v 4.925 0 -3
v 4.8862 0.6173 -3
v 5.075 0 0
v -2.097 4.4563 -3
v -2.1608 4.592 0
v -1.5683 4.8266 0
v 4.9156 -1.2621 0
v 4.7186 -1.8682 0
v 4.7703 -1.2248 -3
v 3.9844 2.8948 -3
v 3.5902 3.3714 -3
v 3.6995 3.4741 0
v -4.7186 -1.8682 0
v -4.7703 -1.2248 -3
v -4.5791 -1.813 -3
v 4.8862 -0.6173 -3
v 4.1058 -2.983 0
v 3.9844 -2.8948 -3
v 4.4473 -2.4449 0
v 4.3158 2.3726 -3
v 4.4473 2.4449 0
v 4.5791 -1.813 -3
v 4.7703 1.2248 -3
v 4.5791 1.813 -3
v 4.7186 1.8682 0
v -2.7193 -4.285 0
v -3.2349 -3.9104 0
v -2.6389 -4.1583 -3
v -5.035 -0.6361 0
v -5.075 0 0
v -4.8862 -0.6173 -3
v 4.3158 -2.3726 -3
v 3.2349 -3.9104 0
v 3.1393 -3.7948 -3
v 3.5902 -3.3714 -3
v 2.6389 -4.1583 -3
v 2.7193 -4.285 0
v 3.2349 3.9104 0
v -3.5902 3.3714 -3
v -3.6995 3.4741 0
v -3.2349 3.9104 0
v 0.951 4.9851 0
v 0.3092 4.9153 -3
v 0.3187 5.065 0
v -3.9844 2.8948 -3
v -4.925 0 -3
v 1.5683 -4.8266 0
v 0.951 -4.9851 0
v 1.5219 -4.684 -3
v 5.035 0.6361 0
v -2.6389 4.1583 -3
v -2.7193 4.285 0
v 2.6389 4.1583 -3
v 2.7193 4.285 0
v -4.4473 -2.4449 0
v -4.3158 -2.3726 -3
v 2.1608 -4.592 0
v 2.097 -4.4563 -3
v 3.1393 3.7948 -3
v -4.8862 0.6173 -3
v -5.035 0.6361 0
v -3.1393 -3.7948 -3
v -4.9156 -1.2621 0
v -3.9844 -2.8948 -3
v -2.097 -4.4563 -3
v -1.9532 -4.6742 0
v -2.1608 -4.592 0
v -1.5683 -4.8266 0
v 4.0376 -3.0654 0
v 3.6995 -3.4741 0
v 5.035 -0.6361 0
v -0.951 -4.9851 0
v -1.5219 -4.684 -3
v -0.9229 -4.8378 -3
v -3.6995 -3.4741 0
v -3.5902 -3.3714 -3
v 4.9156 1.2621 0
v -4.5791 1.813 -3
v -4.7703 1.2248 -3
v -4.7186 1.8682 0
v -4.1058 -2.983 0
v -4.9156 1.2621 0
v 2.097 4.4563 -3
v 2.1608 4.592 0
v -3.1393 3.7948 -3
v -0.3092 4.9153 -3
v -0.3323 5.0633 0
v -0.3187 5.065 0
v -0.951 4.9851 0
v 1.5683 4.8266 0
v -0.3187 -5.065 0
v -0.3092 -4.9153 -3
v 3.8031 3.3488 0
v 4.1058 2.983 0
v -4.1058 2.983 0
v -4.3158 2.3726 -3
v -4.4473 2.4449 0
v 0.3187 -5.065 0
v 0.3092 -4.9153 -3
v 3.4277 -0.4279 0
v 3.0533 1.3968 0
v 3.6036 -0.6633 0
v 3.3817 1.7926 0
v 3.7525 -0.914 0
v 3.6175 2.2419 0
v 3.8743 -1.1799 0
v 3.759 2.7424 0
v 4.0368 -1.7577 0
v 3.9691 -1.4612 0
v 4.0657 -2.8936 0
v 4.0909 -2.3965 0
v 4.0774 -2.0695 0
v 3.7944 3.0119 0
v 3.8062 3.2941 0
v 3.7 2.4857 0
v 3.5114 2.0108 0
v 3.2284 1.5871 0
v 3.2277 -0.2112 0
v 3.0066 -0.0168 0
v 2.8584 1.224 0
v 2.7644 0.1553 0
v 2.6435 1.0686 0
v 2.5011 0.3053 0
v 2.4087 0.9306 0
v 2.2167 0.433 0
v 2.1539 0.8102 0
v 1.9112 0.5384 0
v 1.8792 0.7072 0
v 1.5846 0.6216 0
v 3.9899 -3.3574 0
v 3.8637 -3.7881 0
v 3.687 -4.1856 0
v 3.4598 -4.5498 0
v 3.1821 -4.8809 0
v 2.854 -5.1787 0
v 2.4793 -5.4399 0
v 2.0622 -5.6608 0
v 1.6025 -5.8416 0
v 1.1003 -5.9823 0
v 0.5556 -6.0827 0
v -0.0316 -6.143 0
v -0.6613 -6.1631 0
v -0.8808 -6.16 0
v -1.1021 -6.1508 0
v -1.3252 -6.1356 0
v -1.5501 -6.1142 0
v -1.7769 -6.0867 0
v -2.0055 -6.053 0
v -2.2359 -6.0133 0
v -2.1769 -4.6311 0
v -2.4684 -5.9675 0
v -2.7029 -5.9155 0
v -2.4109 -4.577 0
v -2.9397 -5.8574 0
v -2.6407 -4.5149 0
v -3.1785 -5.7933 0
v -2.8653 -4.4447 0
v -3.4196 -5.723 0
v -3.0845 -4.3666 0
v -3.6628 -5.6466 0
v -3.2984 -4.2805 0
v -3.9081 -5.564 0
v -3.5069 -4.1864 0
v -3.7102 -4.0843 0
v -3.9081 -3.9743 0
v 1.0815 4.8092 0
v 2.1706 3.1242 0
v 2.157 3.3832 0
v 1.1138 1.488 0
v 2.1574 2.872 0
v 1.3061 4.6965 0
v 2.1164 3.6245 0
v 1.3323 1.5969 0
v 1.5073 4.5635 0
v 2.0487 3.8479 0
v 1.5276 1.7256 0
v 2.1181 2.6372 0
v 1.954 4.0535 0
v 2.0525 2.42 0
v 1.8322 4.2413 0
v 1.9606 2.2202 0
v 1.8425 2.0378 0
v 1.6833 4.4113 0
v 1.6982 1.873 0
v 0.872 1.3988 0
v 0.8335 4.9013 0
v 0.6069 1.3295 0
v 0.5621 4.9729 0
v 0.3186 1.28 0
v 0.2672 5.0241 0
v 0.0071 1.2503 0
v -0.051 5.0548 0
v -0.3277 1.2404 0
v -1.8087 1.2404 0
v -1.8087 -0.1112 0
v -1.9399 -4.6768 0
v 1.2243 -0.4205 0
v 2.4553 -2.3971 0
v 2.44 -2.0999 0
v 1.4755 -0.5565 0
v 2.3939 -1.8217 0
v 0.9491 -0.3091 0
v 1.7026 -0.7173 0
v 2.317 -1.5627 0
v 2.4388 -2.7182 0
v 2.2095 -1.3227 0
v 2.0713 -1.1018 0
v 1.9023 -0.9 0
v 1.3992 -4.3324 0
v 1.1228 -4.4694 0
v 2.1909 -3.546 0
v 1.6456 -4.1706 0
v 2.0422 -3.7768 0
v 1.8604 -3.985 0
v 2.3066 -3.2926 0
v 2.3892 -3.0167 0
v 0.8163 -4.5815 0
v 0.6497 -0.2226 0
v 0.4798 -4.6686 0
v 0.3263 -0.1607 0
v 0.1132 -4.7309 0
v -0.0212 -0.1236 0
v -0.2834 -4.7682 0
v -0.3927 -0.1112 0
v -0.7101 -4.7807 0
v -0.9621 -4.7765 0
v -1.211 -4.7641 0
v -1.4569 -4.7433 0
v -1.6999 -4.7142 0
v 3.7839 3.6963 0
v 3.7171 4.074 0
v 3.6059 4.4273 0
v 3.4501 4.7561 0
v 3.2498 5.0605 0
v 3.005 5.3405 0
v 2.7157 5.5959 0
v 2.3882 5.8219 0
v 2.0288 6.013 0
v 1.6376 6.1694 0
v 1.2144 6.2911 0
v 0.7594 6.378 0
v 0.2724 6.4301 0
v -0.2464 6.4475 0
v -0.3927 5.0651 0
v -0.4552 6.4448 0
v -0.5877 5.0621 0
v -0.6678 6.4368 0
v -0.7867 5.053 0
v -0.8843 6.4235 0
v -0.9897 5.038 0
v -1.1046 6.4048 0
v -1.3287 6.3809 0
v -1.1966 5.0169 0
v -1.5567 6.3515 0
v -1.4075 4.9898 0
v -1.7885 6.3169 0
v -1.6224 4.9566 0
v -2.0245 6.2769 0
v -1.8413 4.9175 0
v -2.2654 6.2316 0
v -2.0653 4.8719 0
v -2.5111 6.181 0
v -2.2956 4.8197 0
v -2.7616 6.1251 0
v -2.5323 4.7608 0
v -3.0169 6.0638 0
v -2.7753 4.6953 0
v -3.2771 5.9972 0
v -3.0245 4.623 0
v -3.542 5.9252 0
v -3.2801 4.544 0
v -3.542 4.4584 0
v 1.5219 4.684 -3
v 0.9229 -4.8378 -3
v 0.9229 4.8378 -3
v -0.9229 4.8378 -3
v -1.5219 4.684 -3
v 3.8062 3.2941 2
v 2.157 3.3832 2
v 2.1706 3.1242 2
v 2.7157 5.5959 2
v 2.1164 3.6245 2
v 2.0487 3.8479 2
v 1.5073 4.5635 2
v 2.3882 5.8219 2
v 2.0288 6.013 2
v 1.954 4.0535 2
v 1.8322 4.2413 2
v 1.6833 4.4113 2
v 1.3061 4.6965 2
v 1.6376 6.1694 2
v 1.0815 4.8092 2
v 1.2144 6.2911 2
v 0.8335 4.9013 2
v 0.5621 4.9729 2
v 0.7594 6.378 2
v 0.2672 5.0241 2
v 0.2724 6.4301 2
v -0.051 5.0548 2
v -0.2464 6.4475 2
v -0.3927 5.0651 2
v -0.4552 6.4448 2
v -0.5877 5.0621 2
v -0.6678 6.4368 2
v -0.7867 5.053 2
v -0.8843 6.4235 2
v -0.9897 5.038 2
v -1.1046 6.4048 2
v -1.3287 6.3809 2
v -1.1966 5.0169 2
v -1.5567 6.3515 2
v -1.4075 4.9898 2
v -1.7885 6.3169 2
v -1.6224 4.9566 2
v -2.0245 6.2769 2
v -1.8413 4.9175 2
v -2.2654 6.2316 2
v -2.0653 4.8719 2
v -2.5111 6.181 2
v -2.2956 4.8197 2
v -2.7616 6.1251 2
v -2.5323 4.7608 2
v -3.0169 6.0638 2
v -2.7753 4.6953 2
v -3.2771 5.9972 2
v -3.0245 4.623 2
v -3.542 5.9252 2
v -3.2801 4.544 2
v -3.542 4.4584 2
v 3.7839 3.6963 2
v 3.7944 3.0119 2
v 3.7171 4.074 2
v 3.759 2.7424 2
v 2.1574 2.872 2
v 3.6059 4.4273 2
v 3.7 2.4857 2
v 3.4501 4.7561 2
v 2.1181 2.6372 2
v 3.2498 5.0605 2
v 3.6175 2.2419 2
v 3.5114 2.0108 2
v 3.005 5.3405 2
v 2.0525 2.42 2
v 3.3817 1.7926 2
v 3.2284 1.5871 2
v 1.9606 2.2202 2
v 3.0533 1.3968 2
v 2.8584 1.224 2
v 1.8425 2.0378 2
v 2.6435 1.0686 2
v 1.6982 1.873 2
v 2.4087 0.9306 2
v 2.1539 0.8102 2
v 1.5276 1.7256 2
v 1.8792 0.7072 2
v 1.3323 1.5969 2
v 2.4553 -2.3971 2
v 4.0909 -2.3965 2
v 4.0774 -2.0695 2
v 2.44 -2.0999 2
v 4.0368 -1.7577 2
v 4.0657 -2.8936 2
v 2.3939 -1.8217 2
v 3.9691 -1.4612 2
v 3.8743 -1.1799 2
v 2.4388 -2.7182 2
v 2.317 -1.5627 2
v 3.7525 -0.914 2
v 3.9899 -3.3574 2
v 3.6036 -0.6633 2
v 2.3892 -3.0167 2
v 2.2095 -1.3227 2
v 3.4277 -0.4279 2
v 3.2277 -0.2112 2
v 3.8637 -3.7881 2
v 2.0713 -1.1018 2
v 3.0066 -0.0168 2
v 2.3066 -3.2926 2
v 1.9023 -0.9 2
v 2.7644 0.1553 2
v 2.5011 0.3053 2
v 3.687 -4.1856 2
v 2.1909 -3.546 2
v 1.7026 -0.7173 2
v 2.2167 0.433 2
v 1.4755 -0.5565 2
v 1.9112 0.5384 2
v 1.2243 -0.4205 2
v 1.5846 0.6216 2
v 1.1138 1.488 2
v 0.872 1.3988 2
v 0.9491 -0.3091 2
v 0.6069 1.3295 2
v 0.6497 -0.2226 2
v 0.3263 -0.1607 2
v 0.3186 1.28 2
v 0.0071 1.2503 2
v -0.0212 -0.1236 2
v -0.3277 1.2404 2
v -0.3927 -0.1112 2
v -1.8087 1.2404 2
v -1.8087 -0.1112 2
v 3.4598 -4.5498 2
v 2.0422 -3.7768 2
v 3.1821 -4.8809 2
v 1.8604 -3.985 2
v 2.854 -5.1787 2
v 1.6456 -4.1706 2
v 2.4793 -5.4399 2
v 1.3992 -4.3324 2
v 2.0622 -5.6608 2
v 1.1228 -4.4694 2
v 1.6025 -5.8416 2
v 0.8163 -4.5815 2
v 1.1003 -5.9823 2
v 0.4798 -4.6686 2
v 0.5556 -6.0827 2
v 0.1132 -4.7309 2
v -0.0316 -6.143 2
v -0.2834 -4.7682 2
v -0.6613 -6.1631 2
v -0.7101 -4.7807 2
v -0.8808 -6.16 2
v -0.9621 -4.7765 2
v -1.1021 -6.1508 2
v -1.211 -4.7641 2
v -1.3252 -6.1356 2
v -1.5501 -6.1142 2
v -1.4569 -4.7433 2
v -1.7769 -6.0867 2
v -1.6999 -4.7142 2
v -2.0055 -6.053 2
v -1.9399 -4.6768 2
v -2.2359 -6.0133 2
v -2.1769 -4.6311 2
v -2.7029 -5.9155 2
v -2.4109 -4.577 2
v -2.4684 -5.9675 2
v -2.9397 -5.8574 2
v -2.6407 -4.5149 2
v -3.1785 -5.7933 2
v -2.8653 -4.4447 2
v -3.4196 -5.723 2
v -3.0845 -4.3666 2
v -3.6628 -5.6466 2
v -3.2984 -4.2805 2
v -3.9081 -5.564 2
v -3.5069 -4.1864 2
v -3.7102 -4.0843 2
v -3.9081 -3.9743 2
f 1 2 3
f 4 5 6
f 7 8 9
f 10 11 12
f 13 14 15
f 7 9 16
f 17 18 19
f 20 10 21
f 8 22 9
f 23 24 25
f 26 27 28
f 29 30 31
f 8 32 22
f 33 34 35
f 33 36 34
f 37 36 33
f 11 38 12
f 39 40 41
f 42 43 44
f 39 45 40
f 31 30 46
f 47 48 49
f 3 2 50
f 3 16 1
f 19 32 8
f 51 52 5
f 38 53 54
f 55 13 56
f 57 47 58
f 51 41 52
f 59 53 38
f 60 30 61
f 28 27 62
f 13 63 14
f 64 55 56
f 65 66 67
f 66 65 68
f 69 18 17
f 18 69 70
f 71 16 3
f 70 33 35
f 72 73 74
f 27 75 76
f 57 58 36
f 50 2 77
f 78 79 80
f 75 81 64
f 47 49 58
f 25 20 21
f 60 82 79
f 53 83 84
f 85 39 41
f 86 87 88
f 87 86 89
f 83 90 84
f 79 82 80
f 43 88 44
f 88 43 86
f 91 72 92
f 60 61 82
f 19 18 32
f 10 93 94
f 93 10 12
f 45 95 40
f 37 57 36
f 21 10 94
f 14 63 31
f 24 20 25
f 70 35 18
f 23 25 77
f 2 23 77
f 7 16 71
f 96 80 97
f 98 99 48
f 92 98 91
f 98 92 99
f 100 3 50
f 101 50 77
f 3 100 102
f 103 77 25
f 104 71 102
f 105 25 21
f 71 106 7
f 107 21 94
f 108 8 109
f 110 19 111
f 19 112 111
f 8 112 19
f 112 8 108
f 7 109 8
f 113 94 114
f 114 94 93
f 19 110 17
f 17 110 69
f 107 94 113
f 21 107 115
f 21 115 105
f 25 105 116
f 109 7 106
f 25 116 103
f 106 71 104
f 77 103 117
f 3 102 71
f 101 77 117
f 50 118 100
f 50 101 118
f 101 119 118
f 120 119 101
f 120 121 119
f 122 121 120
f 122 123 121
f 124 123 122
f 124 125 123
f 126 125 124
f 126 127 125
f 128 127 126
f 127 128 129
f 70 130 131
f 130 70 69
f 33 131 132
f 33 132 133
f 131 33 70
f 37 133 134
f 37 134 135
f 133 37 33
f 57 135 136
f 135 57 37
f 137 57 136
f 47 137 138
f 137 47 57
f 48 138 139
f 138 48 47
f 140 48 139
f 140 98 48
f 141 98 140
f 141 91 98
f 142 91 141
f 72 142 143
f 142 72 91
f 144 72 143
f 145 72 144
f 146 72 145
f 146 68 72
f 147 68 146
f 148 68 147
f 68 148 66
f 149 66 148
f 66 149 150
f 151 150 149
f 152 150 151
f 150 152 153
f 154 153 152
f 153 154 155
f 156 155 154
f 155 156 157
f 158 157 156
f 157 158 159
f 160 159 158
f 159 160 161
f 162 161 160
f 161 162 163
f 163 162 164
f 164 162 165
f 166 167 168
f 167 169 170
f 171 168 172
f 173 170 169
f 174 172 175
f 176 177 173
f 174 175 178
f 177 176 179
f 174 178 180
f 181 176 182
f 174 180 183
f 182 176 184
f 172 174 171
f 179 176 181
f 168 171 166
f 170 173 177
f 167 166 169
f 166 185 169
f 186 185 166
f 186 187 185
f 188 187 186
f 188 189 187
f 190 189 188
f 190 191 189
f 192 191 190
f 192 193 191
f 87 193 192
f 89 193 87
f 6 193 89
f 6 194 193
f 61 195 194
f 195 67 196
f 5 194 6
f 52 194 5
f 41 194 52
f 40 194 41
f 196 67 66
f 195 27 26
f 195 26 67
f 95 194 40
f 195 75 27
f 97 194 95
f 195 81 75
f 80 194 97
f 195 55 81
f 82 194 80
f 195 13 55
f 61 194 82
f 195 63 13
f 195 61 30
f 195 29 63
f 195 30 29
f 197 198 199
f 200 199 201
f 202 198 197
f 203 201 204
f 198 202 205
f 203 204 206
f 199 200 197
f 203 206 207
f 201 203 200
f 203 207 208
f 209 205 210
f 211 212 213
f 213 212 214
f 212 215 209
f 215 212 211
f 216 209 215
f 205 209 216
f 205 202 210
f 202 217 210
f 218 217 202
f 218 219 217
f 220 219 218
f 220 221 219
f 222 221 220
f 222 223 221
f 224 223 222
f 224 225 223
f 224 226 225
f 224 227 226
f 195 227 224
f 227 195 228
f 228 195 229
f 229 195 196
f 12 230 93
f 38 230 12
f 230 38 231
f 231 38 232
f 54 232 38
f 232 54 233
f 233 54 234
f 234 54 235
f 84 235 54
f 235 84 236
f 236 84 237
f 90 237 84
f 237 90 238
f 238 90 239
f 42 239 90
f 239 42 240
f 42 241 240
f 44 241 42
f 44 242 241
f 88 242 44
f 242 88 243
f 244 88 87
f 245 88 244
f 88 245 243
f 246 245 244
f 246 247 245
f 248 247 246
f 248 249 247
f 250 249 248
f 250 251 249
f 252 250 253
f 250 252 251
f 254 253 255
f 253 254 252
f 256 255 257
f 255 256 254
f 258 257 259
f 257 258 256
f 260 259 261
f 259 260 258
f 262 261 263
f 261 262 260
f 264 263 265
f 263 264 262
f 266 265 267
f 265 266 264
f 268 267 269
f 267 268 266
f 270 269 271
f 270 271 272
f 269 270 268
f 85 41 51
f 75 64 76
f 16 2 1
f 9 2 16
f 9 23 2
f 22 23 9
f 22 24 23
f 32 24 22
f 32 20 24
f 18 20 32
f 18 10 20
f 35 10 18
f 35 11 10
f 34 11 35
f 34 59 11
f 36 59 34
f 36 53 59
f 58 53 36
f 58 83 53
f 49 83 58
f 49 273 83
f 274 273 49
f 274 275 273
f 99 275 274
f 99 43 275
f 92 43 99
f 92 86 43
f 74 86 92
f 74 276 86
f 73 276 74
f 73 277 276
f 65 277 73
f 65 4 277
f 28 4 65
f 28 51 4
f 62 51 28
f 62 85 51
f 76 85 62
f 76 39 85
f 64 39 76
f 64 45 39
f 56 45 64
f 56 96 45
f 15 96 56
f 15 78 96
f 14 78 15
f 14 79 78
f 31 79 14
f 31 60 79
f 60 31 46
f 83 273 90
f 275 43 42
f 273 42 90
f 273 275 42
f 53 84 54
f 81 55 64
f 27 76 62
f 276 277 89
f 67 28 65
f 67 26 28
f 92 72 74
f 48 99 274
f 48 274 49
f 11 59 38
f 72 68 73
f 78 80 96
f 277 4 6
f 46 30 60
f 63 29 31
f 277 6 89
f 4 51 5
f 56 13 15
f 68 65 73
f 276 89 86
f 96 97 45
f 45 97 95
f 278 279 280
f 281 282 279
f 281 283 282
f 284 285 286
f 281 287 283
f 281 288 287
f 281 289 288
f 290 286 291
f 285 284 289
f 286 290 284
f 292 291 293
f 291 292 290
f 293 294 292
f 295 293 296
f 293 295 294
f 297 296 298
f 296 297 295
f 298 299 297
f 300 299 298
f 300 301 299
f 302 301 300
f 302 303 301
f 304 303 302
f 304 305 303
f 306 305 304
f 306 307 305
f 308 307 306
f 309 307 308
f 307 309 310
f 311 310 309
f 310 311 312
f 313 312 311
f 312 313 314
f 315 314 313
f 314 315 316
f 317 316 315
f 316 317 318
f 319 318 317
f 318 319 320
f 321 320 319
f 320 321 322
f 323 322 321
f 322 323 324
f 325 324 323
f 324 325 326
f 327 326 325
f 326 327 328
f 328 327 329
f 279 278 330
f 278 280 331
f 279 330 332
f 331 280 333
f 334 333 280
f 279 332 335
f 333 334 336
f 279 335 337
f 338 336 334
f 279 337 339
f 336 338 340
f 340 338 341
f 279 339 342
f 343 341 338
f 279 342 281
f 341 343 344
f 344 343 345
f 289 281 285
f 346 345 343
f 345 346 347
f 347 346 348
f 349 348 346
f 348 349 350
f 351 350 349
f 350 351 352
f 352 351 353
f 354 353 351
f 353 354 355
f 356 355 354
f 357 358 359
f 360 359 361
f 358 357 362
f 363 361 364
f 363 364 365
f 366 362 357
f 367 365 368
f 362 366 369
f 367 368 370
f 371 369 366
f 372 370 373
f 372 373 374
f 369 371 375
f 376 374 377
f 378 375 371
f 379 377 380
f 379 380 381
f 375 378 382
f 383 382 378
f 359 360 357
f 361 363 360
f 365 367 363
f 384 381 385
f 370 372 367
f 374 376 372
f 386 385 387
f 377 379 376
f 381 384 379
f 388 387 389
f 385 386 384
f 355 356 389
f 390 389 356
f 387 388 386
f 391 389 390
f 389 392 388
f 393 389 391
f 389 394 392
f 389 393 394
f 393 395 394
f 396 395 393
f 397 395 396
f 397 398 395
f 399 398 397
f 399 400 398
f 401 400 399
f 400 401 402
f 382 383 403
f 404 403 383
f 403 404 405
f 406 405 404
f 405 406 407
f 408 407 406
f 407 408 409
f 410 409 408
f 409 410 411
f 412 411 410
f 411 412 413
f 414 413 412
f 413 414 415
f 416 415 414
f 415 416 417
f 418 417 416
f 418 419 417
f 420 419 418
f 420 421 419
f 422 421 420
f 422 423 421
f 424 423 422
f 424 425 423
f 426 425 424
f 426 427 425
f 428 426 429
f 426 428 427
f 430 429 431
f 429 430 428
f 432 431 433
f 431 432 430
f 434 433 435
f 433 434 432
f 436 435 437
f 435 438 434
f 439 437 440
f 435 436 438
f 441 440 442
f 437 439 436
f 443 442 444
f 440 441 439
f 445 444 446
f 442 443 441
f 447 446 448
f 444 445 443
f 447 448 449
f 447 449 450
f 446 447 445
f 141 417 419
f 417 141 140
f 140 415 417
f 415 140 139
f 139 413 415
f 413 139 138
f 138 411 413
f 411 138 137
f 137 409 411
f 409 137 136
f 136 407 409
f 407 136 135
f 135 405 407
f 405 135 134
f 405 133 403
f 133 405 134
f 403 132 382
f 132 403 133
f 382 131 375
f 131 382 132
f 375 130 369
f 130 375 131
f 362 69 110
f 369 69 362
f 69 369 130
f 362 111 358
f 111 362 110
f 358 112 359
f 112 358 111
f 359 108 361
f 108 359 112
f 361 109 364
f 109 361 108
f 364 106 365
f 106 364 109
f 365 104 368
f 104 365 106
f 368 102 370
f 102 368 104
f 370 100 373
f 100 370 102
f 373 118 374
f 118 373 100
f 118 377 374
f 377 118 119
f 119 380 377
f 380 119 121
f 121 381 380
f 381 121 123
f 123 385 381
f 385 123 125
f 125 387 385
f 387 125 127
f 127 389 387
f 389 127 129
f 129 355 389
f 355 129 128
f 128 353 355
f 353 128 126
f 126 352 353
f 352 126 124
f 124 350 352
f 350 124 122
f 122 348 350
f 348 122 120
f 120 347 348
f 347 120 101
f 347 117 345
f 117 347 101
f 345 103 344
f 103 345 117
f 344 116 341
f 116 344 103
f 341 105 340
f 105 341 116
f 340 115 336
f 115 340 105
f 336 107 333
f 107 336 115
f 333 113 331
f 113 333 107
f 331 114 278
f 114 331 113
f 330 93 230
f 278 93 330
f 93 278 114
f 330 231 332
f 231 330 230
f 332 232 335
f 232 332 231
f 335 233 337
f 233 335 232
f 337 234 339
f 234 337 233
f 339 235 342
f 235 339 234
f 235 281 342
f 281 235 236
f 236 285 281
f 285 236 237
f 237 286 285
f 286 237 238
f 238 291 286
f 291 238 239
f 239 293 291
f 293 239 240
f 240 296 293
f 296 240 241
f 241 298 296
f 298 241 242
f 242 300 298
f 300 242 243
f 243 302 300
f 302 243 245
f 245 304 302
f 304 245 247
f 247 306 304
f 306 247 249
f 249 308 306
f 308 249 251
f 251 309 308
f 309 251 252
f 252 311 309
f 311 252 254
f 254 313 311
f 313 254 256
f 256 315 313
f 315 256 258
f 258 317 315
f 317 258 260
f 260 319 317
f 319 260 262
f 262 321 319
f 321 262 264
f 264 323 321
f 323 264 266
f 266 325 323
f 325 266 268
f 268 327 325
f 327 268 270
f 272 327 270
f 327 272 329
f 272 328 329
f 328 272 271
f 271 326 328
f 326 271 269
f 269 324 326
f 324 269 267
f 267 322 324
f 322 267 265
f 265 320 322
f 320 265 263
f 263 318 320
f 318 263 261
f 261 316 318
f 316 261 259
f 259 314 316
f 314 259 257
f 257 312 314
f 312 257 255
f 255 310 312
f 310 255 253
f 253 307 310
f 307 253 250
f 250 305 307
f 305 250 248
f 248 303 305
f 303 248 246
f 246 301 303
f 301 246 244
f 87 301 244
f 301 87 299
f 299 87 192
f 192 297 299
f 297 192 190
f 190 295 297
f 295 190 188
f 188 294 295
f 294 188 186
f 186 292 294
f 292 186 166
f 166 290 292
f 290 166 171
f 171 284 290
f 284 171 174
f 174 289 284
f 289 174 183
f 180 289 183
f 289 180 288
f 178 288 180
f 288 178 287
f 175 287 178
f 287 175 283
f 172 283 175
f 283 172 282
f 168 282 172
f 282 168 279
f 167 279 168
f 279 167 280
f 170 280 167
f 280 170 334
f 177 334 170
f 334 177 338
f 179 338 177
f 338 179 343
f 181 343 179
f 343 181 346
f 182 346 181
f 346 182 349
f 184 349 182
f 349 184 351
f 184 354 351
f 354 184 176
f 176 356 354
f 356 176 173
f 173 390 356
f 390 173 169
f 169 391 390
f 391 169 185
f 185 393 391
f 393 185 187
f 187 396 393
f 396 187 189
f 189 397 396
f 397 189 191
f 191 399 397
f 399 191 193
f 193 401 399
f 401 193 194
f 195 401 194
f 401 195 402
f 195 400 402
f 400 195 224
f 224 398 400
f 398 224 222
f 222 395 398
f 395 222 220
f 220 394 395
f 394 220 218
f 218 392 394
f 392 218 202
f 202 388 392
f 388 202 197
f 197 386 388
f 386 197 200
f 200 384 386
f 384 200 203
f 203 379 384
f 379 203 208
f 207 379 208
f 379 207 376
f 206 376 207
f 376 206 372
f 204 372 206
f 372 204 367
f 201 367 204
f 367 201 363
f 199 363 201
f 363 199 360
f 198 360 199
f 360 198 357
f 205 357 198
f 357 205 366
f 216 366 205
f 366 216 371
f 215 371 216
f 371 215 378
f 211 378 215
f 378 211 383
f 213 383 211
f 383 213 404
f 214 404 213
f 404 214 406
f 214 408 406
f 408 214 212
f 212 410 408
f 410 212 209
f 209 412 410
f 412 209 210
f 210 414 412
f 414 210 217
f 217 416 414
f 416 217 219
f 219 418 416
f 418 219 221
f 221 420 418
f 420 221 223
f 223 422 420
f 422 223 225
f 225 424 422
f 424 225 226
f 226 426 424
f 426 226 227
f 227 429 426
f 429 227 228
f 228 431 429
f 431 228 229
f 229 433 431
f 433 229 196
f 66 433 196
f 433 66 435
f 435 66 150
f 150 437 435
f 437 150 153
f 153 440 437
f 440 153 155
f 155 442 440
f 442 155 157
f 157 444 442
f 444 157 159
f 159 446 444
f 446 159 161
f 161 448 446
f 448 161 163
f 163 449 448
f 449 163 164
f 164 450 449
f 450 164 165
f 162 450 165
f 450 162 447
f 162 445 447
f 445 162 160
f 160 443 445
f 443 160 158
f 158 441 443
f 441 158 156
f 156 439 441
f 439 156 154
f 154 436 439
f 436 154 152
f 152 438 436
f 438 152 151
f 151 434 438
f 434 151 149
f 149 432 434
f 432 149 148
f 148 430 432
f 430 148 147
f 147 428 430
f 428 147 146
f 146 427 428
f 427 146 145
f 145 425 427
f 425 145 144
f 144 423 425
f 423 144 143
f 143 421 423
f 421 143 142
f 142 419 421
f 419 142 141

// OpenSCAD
$fn = 50;

difference() {
	union() {
		translate(v = [0, 0, -3.0]) {
			cylinder(h = 3, r1 = 4.925, r2 = 5.075);
		}
		linear_extrude(height = 2) {
			text(font = "Impact", halign = "center", size = 12, text = "3", valign = "center");
		}
	}
	union();
}
